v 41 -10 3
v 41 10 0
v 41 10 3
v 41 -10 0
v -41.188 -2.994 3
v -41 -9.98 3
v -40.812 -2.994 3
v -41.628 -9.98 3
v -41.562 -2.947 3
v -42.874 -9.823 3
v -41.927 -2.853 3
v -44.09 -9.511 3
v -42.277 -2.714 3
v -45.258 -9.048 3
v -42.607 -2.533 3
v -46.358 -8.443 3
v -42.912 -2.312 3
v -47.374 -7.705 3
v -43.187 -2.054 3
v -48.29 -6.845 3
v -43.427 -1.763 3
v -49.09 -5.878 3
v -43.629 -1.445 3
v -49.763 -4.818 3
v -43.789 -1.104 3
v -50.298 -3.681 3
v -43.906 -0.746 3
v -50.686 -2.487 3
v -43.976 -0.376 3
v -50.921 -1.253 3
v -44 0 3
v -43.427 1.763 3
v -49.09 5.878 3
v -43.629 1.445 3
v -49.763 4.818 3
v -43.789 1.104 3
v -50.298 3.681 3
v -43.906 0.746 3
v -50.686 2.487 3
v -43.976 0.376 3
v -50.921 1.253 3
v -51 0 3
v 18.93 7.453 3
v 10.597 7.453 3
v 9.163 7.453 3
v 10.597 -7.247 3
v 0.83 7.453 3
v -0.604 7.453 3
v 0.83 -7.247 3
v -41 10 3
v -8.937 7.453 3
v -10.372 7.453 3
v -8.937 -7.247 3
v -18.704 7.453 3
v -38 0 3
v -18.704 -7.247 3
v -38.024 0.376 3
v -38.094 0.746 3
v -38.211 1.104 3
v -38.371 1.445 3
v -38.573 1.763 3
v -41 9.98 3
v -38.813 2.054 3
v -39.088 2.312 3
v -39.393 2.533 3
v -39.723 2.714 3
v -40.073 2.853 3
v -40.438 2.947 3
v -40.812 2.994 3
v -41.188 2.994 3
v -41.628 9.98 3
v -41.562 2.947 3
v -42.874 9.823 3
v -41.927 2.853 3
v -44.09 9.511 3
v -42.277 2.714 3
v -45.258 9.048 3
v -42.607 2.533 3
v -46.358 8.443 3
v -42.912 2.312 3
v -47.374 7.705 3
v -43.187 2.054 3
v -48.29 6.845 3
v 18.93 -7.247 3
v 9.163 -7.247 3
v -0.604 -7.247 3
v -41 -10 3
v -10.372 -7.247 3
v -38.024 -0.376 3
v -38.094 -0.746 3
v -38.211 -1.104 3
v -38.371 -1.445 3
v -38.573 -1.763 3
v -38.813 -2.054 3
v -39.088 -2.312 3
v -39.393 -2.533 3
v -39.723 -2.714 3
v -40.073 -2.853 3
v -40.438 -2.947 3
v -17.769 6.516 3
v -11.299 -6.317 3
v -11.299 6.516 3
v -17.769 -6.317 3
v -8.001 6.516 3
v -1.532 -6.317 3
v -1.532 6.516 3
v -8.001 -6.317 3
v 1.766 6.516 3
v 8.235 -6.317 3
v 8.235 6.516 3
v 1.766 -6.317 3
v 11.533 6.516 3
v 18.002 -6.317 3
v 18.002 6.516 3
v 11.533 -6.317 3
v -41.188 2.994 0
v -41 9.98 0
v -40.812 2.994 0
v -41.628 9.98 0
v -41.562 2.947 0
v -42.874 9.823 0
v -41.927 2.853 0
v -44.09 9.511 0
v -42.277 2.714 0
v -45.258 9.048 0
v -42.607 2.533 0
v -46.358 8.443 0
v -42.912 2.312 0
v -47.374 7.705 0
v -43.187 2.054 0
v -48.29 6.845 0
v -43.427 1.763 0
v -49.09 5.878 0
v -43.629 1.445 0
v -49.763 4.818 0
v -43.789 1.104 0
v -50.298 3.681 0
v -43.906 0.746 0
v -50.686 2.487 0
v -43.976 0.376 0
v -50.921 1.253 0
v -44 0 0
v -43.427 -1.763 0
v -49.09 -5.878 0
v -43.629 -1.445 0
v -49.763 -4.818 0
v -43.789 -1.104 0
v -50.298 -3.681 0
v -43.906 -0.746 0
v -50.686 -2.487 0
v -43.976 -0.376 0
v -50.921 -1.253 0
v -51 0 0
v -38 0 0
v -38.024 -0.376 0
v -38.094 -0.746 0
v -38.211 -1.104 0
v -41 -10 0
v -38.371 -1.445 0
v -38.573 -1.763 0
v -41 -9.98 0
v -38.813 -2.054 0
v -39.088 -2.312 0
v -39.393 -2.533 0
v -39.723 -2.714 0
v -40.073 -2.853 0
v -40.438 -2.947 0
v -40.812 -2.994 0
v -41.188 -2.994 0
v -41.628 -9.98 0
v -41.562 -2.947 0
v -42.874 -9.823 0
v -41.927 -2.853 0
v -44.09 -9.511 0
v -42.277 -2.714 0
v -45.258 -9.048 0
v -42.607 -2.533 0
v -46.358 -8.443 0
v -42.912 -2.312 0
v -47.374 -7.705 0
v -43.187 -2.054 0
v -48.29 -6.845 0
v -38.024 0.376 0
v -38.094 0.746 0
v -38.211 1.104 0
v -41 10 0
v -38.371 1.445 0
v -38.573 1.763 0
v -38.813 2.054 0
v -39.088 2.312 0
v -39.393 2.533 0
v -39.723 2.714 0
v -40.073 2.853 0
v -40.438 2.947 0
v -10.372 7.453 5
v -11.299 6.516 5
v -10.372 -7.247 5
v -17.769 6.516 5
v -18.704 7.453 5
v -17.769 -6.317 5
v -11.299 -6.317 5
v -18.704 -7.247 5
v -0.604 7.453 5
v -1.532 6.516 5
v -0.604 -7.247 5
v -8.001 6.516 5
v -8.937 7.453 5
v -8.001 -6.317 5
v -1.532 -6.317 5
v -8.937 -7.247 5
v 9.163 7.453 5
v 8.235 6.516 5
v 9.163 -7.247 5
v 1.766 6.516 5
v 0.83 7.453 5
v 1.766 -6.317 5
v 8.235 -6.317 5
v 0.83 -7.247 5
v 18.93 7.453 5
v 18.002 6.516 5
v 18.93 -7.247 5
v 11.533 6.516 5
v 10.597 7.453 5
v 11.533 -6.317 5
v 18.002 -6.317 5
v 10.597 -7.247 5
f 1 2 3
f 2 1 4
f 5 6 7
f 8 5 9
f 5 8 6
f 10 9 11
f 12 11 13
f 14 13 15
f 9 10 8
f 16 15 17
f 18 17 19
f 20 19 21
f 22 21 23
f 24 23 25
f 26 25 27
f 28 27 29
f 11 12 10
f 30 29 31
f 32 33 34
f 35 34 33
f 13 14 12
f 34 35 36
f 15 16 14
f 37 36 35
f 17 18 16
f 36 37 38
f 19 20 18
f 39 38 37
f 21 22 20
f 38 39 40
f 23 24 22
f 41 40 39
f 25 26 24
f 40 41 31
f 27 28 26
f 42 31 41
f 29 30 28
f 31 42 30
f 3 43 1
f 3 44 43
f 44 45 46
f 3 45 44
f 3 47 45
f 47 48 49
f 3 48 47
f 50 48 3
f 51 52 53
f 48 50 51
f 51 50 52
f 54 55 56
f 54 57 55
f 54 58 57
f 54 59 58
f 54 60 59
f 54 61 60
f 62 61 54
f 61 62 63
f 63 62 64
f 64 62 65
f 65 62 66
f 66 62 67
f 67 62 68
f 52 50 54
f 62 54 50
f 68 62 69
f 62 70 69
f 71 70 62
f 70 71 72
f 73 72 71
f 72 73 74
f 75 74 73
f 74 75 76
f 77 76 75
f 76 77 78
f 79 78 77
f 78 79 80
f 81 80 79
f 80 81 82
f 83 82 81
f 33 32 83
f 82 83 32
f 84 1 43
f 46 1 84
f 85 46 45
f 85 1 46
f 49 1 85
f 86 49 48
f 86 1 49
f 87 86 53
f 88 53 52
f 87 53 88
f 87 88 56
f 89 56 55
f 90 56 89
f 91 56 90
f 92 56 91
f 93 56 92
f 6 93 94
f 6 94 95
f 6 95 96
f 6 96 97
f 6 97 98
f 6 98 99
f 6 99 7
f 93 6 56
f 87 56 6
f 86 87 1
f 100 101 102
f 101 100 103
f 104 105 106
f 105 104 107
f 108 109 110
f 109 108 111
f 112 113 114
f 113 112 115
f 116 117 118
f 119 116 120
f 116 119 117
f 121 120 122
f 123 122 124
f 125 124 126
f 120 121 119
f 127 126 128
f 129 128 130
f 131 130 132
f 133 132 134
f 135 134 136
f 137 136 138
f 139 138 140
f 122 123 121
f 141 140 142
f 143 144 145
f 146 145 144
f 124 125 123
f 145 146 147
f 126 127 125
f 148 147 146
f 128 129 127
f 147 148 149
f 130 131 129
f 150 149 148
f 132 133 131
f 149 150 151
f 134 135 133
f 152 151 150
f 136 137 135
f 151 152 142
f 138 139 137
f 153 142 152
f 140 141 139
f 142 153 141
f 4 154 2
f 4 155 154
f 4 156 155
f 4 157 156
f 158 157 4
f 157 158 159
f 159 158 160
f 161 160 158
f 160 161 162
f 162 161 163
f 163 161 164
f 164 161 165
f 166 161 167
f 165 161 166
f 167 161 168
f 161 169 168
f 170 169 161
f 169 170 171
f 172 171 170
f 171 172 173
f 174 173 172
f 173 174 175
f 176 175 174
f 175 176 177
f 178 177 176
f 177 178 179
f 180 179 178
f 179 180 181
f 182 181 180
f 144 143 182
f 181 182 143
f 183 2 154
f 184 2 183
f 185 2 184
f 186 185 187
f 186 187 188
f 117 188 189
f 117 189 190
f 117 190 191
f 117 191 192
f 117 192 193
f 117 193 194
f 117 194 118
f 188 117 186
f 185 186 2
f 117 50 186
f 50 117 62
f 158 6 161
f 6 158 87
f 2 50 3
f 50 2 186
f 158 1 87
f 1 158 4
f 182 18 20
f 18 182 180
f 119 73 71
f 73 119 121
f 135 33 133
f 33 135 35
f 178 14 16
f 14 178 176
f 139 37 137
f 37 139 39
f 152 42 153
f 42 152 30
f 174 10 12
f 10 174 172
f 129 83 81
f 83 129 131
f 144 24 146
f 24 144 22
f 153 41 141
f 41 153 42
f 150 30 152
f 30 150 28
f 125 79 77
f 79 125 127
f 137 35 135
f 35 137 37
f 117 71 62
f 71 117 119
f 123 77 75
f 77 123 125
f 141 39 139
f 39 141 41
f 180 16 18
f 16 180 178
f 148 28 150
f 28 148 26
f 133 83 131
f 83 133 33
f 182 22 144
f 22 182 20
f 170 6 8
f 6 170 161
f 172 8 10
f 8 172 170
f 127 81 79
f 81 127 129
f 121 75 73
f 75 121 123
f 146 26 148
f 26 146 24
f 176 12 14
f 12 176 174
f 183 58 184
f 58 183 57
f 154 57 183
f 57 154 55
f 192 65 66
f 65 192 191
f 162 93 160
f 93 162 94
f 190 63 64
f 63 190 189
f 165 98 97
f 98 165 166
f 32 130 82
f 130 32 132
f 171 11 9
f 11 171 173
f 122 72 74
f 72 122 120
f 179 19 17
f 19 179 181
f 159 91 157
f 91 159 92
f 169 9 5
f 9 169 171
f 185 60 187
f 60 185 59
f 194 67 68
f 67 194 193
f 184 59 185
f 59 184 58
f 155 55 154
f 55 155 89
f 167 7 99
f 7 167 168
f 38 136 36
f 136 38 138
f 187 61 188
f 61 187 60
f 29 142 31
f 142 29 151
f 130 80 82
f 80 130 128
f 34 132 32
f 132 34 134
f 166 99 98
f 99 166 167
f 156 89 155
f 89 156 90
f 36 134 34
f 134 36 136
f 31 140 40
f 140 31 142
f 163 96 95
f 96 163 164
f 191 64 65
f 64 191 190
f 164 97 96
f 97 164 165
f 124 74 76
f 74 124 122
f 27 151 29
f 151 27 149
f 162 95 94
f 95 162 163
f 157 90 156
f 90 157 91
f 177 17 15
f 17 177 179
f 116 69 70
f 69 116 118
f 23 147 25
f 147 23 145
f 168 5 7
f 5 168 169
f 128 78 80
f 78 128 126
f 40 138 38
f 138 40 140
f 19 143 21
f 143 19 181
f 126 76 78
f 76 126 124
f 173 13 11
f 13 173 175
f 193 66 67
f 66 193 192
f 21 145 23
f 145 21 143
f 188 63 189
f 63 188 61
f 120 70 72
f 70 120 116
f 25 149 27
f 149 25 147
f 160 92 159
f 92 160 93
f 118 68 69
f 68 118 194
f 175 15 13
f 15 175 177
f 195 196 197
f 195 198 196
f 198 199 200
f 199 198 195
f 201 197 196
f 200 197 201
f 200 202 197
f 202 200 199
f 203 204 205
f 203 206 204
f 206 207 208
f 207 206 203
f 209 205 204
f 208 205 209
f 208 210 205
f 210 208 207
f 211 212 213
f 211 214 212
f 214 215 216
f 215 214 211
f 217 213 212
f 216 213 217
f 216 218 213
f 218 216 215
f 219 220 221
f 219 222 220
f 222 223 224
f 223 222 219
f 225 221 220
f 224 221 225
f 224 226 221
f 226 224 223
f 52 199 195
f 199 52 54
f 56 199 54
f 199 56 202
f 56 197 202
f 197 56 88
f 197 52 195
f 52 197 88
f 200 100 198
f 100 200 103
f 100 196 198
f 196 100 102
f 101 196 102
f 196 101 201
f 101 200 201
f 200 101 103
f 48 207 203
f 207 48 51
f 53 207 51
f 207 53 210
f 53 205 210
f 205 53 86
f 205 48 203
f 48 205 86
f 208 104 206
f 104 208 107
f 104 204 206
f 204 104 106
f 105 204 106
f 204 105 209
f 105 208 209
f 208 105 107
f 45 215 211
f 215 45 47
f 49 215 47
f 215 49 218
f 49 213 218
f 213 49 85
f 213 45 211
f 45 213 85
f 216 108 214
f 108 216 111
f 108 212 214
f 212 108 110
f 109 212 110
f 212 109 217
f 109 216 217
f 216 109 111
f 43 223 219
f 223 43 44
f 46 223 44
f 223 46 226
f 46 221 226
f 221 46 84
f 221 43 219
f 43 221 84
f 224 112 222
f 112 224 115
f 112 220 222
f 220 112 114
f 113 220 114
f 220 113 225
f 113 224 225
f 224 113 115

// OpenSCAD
// Language mode switch
japanese_mode = true;  // Set to false for English text

// Messages
japanese_message = "日本沖縄";
english_message = "Japan Okinawa";

// Font settings
japanese_font = "Hiragino Mincho ProN";
english_font = "Liberation Sans";  // A common font for English
font_size = 12;
font_thickness = 5;

// Keychain dimensions
stick_thickness = 3;
stick_width = 20;
hole_radius = 3;
flat_bottom = 1; //[1:Yes,2:No]
buffer = 10;

// Select message and font based on mode
message = japanese_mode ? japanese_message : english_message;
font = japanese_mode ? japanese_font : english_font;

// Calculate text size for baseplate
// Different multipliers for Japanese and English
text_width = japanese_mode ? 
    len(message) * font_size * 1.5 :  // Japanese spacing
    len(message) * font_size * 0.7;   // English spacing

// Main assembly
translate([0, 0, font_thickness/2]) {
    union() {
        // Text with proper centering
        translate([0, 0, 0])
            linear_extrude(height = font_thickness, center = true)
                text(message, 
                     size = font_size, 
                     font = font, 
                     halign = "center", 
                     valign = "center");
        
        // Baseplate
        if (flat_bottom == 1)
            translate([0, 0, -font_thickness/2 + stick_thickness/2])
                flatstickwithhole();
        
        if (flat_bottom == 2)
            flatstickwithhole();
    }
}

module flatstickwithhole() {
    difference() {
        union() {
            // Main plate
            translate([0, 0, 0])
                cube([text_width + buffer, stick_width, stick_thickness], 
                     center = true);
            
            // End circle
            translate([-text_width/2 - buffer/2, 0, 0])
                cylinder(r = stick_width/2, 
                        h = stick_thickness, 
                        center = true, 
                        $fn = 50);
        }
        
        // Hole
        translate([-text_width/2 - buffer/2, 0, 0])
            cylinder(r = hole_radius, 
                    h = stick_thickness + 2, 
                    center = true, 
                    $fn = 50);
    }
}
